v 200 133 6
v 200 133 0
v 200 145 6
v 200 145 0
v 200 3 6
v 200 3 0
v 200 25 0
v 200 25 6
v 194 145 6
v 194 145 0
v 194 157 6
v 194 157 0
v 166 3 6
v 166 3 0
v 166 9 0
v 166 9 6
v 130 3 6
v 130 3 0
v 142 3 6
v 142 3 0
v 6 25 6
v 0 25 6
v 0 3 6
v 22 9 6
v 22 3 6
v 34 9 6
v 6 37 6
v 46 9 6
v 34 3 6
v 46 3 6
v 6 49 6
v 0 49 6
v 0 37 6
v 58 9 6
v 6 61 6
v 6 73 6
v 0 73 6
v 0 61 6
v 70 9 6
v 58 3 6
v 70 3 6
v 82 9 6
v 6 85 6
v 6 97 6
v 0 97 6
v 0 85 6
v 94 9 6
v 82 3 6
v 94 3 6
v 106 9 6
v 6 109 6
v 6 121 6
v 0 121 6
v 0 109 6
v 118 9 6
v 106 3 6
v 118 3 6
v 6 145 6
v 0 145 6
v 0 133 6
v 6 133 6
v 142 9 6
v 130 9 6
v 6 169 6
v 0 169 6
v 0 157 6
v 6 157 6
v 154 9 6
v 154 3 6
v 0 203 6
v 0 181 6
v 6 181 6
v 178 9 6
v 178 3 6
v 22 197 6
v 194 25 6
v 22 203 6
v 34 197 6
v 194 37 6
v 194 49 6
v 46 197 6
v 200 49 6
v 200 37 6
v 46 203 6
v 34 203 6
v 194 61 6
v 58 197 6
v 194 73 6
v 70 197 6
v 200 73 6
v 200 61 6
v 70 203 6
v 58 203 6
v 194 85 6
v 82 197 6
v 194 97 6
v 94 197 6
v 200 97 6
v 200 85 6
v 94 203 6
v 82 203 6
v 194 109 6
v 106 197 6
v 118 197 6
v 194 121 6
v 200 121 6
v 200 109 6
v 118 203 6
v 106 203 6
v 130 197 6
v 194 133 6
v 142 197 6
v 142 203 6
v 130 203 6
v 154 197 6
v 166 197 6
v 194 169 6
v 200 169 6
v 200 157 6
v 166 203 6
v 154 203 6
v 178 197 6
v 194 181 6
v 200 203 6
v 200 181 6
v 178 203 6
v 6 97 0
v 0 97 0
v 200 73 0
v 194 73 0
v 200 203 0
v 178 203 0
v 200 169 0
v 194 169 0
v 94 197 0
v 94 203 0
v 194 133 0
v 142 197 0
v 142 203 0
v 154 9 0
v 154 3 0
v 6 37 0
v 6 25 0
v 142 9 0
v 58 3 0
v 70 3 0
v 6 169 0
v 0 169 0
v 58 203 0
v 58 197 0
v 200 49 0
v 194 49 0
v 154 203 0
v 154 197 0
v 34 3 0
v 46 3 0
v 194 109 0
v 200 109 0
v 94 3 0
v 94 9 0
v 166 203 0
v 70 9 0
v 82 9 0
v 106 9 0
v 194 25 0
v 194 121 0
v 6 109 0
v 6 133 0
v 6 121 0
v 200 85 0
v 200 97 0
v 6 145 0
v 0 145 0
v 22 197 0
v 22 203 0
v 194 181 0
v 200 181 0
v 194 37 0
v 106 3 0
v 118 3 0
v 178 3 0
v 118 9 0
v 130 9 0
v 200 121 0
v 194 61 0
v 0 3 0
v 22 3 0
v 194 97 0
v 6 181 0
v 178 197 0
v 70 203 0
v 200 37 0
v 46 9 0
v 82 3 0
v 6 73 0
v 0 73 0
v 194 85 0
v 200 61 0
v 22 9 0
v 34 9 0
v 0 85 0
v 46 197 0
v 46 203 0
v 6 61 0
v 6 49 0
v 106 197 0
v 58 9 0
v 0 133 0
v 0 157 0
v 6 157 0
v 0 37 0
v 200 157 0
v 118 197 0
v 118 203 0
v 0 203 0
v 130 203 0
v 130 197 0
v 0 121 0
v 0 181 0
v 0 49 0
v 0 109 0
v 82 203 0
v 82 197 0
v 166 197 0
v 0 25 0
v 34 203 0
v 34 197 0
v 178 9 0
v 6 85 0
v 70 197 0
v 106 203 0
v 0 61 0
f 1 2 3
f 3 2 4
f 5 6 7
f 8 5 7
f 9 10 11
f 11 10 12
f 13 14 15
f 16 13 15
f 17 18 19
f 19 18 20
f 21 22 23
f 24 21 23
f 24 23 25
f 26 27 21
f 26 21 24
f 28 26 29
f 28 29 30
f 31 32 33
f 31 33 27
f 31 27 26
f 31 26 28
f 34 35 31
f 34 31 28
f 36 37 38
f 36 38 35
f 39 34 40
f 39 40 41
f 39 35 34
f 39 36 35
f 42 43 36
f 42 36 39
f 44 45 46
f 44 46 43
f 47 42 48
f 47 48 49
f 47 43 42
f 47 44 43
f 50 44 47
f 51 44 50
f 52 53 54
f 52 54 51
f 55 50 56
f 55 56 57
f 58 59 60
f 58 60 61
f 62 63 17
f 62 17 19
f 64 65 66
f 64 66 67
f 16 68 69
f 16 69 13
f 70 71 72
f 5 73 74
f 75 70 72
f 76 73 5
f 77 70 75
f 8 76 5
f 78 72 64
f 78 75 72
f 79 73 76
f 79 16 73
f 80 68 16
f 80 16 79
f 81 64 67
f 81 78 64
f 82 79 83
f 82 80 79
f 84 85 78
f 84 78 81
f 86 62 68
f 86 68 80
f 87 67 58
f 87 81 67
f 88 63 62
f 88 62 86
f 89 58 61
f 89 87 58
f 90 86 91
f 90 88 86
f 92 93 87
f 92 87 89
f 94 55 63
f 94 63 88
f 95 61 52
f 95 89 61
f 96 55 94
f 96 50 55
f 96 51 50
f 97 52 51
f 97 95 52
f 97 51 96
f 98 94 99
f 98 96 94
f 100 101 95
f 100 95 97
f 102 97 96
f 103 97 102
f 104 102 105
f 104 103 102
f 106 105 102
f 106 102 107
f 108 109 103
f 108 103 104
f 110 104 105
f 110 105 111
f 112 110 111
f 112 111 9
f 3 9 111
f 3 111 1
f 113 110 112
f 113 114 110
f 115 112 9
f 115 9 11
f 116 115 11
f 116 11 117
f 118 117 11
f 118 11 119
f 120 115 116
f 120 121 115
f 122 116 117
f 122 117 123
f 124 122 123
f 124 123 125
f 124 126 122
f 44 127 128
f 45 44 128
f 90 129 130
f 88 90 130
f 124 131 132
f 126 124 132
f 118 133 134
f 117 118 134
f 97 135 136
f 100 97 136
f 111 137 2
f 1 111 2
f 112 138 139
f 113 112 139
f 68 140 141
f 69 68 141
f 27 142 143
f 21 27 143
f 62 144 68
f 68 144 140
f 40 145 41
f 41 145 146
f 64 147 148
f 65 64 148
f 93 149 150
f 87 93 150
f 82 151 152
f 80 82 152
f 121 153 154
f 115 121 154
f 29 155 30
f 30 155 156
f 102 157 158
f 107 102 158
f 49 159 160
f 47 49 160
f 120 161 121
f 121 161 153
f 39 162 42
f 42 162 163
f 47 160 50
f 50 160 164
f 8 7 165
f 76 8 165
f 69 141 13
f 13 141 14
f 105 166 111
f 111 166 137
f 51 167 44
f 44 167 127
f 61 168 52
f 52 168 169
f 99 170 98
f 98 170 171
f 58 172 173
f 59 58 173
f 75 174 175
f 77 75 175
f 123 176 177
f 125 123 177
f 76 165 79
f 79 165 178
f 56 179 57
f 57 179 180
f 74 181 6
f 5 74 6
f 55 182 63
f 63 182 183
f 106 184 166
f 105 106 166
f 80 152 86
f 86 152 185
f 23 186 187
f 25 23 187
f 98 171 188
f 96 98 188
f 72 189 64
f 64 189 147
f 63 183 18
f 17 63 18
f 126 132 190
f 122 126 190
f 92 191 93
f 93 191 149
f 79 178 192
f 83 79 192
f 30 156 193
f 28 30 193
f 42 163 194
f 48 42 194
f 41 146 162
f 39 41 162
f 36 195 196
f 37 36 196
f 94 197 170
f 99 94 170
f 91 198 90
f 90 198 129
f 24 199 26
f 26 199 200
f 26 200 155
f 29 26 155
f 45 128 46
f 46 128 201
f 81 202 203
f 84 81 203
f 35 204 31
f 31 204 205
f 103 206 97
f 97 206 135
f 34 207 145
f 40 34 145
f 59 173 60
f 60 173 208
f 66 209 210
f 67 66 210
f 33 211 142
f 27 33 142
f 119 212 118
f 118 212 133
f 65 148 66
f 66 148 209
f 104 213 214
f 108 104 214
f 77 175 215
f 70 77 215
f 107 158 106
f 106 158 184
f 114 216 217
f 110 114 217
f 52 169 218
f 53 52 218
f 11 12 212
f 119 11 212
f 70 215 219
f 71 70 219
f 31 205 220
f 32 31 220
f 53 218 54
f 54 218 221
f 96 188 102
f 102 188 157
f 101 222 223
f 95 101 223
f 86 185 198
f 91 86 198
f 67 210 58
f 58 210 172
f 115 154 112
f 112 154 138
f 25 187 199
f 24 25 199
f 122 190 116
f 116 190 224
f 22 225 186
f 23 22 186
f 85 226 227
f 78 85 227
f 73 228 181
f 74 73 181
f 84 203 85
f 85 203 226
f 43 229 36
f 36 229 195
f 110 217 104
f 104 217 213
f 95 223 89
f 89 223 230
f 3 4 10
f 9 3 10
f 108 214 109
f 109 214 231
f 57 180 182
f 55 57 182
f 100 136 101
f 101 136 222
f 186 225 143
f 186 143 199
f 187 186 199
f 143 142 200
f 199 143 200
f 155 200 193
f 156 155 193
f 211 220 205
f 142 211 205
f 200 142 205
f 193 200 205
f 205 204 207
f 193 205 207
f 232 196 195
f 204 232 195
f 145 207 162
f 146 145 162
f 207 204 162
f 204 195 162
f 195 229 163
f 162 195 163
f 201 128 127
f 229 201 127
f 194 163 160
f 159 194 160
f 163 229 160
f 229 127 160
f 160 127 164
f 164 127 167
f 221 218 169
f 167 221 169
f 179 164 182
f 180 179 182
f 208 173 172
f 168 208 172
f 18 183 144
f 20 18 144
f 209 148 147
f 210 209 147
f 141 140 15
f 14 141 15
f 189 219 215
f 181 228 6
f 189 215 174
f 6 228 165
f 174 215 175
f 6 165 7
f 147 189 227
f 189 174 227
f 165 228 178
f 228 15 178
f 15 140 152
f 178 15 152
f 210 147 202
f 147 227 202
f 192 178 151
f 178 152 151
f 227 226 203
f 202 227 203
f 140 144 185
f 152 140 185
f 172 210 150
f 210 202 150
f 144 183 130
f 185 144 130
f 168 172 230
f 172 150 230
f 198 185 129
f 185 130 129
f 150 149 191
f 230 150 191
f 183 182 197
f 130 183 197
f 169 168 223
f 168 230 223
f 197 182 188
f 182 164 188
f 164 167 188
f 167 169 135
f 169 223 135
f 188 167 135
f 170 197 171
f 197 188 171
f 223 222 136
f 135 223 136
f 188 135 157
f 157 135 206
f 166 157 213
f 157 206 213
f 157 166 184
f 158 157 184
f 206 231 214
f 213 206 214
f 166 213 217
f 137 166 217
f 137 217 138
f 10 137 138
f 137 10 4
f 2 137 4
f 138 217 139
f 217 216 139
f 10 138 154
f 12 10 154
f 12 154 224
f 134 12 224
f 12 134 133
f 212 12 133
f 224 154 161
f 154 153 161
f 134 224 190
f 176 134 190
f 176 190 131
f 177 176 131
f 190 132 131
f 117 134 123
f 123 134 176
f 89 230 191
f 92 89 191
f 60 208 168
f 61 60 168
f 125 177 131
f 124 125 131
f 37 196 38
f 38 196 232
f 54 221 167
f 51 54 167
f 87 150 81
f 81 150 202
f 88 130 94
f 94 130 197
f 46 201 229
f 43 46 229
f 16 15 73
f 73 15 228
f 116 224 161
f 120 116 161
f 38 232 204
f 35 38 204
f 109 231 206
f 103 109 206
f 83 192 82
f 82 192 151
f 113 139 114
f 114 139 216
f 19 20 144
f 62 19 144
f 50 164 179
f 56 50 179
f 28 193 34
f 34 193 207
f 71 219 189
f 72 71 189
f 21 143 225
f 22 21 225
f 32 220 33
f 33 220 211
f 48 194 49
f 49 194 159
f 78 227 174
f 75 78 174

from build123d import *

# Parameters (mm, degrees)
BOSS_EXTRUDE1_DEPTH = 6


with BuildPart() as part:
    # Model → Boss-Extrude1 (new body)
    with BuildSketch(Plane.XY):
        Polygon((0, 203), (0, 181), (6, 181), (6, 169), (0, 169), (0, 157), (6, 157), (6, 145), (0, 145), (0, 133), (6, 133), (6, 121), (0, 121), (0, 109), (6, 109), (6, 97), (0, 97), (0, 85), (6, 85), (6, 73), (0, 73), (0, 61), (6, 61), (6, 49), (0, 49), (0, 37), (6, 37), (6, 25), (0, 25), (0, 13), (0, 3), (22, 3), (22, 9), (34, 9), (34, 3), (46, 3), (46, 9), (58, 9), (58, 3), (70, 3), (70, 9), (82, 9), (82, 3), (94, 3), (94, 9), (106, 9), (106, 3), (118, 3), (118, 9), (130, 9), (130, 3), (142, 3), (142, 9), (154, 9), (154, 3), (166, 3), (166, 9), (178, 9), (178, 3), (190, 3), (200, 3), (200, 25), (194, 25), (194, 37), (200, 37), (200, 49), (194, 49), (194, 61), (200, 61), (200, 73), (194, 73), (194, 85), (200, 85), (200, 97), (194, 97), (194, 109), (200, 109), (200, 121), (194, 121), (194, 133), (200, 133), (200, 145), (194, 145), (194, 157), (200, 157), (200, 169), (194, 169), (194, 181), (200, 181), (200, 193), (200, 203), (178, 203), (178, 197), (166, 197), (166, 203), (154, 203), (154, 197), (142, 197), (142, 203), (130, 203), (130, 197), (118, 197), (118, 203), (106, 203), (106, 197), (94, 197), (94, 203), (82, 203), (82, 197), (70, 197), (70, 203), (58, 203), (58, 197), (46, 197), (46, 203), (34, 203), (34, 197), (22, 197), (22, 203), (10, 203), align=None)
    extrude(amount=BOSS_EXTRUDE1_DEPTH)


solid = part.part
